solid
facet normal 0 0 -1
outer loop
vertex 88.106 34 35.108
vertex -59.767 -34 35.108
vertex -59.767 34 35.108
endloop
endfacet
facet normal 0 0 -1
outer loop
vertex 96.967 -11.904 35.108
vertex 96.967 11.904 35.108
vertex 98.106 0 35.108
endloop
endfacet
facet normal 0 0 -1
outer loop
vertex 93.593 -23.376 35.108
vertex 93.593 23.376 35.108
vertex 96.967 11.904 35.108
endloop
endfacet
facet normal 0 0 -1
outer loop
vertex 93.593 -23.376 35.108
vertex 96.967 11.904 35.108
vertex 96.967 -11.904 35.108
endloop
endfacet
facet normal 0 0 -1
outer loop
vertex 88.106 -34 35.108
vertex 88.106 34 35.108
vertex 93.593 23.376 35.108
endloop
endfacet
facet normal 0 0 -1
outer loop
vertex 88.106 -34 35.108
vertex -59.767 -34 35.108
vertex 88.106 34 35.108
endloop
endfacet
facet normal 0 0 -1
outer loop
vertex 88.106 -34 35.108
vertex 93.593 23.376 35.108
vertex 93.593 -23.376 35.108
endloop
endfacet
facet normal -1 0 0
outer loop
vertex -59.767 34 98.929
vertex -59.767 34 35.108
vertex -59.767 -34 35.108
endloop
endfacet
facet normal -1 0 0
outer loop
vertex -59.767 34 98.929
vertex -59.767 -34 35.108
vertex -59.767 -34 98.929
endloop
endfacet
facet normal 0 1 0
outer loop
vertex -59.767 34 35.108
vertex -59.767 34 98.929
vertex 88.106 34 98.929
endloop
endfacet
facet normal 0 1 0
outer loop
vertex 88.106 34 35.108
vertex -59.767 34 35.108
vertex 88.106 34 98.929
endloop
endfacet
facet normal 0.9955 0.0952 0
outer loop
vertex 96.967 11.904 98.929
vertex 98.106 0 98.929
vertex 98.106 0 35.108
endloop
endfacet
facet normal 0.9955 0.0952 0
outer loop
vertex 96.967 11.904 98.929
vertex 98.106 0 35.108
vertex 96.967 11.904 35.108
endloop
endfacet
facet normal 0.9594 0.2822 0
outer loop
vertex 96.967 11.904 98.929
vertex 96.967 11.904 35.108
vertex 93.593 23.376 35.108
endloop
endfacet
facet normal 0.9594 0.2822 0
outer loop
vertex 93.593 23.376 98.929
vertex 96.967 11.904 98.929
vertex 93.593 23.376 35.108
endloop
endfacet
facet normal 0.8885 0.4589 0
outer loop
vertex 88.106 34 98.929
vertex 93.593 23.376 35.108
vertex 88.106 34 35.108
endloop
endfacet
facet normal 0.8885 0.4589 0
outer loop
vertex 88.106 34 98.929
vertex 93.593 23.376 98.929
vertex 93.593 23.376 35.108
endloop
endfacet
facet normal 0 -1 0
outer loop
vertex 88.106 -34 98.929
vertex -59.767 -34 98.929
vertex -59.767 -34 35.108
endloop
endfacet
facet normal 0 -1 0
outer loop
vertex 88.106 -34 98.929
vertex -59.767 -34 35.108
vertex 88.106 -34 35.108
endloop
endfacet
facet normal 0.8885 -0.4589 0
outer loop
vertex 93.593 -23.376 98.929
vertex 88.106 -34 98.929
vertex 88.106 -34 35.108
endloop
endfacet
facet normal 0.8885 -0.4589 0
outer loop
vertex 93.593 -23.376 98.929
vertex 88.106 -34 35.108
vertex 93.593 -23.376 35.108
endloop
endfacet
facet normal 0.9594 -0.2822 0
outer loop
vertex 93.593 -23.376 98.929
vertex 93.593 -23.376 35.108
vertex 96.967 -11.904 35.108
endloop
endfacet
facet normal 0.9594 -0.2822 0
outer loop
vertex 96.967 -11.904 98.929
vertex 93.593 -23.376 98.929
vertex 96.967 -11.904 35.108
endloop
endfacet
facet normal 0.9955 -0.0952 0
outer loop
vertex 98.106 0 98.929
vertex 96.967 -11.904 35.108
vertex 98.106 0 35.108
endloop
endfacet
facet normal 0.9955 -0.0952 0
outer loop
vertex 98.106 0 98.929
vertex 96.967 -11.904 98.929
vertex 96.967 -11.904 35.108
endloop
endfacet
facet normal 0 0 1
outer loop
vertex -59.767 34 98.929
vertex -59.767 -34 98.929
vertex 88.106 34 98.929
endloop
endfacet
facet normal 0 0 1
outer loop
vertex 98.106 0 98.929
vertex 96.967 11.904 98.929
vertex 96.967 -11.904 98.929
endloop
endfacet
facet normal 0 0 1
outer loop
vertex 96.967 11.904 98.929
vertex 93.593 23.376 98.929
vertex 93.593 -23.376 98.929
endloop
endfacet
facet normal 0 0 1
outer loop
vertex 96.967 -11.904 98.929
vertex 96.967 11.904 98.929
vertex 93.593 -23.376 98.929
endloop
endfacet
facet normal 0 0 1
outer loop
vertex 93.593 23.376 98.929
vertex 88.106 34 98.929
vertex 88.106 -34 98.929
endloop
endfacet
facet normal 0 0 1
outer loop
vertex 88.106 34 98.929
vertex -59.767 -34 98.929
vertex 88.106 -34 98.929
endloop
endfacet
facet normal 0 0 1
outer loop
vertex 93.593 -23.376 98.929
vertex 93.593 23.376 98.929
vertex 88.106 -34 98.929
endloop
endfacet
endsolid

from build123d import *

# Parameters (mm, degrees)
F0_W     = 157.873229
F0_H     = 63.821092
F1_DEPTH = 34
F3_DEPTH = 63.821092


with BuildPart() as f1:
    # F0 (on Front) → F1 (new body, symmetric)
    with BuildSketch(Plane.XZ):
        with Locations((19.16913, 67.018941)):
            Rectangle(F0_W, F0_H)
    extrude(amount=F1_DEPTH, both=True)

    # F2 (on face) → F3 (intersect, through all)
    with BuildSketch(Plane.XY.offset(98.929487)):
        with BuildLine():
            Line((-59.767485, 34), (-59.767485, -34))
            Line((-59.767485, -34), (88.105744, -34))
            ThreePointArc((88.105744, -34), (95.553897, -17.720045), (98.105744, 0))
            ThreePointArc((98.105744, 0), (95.553897, 17.720045), (88.105744, 34))
            Line((88.105744, 34), (-59.767485, 34))
        make_face()
    extrude(amount=-F3_DEPTH, mode=Mode.INTERSECT)


solid = f1.part
